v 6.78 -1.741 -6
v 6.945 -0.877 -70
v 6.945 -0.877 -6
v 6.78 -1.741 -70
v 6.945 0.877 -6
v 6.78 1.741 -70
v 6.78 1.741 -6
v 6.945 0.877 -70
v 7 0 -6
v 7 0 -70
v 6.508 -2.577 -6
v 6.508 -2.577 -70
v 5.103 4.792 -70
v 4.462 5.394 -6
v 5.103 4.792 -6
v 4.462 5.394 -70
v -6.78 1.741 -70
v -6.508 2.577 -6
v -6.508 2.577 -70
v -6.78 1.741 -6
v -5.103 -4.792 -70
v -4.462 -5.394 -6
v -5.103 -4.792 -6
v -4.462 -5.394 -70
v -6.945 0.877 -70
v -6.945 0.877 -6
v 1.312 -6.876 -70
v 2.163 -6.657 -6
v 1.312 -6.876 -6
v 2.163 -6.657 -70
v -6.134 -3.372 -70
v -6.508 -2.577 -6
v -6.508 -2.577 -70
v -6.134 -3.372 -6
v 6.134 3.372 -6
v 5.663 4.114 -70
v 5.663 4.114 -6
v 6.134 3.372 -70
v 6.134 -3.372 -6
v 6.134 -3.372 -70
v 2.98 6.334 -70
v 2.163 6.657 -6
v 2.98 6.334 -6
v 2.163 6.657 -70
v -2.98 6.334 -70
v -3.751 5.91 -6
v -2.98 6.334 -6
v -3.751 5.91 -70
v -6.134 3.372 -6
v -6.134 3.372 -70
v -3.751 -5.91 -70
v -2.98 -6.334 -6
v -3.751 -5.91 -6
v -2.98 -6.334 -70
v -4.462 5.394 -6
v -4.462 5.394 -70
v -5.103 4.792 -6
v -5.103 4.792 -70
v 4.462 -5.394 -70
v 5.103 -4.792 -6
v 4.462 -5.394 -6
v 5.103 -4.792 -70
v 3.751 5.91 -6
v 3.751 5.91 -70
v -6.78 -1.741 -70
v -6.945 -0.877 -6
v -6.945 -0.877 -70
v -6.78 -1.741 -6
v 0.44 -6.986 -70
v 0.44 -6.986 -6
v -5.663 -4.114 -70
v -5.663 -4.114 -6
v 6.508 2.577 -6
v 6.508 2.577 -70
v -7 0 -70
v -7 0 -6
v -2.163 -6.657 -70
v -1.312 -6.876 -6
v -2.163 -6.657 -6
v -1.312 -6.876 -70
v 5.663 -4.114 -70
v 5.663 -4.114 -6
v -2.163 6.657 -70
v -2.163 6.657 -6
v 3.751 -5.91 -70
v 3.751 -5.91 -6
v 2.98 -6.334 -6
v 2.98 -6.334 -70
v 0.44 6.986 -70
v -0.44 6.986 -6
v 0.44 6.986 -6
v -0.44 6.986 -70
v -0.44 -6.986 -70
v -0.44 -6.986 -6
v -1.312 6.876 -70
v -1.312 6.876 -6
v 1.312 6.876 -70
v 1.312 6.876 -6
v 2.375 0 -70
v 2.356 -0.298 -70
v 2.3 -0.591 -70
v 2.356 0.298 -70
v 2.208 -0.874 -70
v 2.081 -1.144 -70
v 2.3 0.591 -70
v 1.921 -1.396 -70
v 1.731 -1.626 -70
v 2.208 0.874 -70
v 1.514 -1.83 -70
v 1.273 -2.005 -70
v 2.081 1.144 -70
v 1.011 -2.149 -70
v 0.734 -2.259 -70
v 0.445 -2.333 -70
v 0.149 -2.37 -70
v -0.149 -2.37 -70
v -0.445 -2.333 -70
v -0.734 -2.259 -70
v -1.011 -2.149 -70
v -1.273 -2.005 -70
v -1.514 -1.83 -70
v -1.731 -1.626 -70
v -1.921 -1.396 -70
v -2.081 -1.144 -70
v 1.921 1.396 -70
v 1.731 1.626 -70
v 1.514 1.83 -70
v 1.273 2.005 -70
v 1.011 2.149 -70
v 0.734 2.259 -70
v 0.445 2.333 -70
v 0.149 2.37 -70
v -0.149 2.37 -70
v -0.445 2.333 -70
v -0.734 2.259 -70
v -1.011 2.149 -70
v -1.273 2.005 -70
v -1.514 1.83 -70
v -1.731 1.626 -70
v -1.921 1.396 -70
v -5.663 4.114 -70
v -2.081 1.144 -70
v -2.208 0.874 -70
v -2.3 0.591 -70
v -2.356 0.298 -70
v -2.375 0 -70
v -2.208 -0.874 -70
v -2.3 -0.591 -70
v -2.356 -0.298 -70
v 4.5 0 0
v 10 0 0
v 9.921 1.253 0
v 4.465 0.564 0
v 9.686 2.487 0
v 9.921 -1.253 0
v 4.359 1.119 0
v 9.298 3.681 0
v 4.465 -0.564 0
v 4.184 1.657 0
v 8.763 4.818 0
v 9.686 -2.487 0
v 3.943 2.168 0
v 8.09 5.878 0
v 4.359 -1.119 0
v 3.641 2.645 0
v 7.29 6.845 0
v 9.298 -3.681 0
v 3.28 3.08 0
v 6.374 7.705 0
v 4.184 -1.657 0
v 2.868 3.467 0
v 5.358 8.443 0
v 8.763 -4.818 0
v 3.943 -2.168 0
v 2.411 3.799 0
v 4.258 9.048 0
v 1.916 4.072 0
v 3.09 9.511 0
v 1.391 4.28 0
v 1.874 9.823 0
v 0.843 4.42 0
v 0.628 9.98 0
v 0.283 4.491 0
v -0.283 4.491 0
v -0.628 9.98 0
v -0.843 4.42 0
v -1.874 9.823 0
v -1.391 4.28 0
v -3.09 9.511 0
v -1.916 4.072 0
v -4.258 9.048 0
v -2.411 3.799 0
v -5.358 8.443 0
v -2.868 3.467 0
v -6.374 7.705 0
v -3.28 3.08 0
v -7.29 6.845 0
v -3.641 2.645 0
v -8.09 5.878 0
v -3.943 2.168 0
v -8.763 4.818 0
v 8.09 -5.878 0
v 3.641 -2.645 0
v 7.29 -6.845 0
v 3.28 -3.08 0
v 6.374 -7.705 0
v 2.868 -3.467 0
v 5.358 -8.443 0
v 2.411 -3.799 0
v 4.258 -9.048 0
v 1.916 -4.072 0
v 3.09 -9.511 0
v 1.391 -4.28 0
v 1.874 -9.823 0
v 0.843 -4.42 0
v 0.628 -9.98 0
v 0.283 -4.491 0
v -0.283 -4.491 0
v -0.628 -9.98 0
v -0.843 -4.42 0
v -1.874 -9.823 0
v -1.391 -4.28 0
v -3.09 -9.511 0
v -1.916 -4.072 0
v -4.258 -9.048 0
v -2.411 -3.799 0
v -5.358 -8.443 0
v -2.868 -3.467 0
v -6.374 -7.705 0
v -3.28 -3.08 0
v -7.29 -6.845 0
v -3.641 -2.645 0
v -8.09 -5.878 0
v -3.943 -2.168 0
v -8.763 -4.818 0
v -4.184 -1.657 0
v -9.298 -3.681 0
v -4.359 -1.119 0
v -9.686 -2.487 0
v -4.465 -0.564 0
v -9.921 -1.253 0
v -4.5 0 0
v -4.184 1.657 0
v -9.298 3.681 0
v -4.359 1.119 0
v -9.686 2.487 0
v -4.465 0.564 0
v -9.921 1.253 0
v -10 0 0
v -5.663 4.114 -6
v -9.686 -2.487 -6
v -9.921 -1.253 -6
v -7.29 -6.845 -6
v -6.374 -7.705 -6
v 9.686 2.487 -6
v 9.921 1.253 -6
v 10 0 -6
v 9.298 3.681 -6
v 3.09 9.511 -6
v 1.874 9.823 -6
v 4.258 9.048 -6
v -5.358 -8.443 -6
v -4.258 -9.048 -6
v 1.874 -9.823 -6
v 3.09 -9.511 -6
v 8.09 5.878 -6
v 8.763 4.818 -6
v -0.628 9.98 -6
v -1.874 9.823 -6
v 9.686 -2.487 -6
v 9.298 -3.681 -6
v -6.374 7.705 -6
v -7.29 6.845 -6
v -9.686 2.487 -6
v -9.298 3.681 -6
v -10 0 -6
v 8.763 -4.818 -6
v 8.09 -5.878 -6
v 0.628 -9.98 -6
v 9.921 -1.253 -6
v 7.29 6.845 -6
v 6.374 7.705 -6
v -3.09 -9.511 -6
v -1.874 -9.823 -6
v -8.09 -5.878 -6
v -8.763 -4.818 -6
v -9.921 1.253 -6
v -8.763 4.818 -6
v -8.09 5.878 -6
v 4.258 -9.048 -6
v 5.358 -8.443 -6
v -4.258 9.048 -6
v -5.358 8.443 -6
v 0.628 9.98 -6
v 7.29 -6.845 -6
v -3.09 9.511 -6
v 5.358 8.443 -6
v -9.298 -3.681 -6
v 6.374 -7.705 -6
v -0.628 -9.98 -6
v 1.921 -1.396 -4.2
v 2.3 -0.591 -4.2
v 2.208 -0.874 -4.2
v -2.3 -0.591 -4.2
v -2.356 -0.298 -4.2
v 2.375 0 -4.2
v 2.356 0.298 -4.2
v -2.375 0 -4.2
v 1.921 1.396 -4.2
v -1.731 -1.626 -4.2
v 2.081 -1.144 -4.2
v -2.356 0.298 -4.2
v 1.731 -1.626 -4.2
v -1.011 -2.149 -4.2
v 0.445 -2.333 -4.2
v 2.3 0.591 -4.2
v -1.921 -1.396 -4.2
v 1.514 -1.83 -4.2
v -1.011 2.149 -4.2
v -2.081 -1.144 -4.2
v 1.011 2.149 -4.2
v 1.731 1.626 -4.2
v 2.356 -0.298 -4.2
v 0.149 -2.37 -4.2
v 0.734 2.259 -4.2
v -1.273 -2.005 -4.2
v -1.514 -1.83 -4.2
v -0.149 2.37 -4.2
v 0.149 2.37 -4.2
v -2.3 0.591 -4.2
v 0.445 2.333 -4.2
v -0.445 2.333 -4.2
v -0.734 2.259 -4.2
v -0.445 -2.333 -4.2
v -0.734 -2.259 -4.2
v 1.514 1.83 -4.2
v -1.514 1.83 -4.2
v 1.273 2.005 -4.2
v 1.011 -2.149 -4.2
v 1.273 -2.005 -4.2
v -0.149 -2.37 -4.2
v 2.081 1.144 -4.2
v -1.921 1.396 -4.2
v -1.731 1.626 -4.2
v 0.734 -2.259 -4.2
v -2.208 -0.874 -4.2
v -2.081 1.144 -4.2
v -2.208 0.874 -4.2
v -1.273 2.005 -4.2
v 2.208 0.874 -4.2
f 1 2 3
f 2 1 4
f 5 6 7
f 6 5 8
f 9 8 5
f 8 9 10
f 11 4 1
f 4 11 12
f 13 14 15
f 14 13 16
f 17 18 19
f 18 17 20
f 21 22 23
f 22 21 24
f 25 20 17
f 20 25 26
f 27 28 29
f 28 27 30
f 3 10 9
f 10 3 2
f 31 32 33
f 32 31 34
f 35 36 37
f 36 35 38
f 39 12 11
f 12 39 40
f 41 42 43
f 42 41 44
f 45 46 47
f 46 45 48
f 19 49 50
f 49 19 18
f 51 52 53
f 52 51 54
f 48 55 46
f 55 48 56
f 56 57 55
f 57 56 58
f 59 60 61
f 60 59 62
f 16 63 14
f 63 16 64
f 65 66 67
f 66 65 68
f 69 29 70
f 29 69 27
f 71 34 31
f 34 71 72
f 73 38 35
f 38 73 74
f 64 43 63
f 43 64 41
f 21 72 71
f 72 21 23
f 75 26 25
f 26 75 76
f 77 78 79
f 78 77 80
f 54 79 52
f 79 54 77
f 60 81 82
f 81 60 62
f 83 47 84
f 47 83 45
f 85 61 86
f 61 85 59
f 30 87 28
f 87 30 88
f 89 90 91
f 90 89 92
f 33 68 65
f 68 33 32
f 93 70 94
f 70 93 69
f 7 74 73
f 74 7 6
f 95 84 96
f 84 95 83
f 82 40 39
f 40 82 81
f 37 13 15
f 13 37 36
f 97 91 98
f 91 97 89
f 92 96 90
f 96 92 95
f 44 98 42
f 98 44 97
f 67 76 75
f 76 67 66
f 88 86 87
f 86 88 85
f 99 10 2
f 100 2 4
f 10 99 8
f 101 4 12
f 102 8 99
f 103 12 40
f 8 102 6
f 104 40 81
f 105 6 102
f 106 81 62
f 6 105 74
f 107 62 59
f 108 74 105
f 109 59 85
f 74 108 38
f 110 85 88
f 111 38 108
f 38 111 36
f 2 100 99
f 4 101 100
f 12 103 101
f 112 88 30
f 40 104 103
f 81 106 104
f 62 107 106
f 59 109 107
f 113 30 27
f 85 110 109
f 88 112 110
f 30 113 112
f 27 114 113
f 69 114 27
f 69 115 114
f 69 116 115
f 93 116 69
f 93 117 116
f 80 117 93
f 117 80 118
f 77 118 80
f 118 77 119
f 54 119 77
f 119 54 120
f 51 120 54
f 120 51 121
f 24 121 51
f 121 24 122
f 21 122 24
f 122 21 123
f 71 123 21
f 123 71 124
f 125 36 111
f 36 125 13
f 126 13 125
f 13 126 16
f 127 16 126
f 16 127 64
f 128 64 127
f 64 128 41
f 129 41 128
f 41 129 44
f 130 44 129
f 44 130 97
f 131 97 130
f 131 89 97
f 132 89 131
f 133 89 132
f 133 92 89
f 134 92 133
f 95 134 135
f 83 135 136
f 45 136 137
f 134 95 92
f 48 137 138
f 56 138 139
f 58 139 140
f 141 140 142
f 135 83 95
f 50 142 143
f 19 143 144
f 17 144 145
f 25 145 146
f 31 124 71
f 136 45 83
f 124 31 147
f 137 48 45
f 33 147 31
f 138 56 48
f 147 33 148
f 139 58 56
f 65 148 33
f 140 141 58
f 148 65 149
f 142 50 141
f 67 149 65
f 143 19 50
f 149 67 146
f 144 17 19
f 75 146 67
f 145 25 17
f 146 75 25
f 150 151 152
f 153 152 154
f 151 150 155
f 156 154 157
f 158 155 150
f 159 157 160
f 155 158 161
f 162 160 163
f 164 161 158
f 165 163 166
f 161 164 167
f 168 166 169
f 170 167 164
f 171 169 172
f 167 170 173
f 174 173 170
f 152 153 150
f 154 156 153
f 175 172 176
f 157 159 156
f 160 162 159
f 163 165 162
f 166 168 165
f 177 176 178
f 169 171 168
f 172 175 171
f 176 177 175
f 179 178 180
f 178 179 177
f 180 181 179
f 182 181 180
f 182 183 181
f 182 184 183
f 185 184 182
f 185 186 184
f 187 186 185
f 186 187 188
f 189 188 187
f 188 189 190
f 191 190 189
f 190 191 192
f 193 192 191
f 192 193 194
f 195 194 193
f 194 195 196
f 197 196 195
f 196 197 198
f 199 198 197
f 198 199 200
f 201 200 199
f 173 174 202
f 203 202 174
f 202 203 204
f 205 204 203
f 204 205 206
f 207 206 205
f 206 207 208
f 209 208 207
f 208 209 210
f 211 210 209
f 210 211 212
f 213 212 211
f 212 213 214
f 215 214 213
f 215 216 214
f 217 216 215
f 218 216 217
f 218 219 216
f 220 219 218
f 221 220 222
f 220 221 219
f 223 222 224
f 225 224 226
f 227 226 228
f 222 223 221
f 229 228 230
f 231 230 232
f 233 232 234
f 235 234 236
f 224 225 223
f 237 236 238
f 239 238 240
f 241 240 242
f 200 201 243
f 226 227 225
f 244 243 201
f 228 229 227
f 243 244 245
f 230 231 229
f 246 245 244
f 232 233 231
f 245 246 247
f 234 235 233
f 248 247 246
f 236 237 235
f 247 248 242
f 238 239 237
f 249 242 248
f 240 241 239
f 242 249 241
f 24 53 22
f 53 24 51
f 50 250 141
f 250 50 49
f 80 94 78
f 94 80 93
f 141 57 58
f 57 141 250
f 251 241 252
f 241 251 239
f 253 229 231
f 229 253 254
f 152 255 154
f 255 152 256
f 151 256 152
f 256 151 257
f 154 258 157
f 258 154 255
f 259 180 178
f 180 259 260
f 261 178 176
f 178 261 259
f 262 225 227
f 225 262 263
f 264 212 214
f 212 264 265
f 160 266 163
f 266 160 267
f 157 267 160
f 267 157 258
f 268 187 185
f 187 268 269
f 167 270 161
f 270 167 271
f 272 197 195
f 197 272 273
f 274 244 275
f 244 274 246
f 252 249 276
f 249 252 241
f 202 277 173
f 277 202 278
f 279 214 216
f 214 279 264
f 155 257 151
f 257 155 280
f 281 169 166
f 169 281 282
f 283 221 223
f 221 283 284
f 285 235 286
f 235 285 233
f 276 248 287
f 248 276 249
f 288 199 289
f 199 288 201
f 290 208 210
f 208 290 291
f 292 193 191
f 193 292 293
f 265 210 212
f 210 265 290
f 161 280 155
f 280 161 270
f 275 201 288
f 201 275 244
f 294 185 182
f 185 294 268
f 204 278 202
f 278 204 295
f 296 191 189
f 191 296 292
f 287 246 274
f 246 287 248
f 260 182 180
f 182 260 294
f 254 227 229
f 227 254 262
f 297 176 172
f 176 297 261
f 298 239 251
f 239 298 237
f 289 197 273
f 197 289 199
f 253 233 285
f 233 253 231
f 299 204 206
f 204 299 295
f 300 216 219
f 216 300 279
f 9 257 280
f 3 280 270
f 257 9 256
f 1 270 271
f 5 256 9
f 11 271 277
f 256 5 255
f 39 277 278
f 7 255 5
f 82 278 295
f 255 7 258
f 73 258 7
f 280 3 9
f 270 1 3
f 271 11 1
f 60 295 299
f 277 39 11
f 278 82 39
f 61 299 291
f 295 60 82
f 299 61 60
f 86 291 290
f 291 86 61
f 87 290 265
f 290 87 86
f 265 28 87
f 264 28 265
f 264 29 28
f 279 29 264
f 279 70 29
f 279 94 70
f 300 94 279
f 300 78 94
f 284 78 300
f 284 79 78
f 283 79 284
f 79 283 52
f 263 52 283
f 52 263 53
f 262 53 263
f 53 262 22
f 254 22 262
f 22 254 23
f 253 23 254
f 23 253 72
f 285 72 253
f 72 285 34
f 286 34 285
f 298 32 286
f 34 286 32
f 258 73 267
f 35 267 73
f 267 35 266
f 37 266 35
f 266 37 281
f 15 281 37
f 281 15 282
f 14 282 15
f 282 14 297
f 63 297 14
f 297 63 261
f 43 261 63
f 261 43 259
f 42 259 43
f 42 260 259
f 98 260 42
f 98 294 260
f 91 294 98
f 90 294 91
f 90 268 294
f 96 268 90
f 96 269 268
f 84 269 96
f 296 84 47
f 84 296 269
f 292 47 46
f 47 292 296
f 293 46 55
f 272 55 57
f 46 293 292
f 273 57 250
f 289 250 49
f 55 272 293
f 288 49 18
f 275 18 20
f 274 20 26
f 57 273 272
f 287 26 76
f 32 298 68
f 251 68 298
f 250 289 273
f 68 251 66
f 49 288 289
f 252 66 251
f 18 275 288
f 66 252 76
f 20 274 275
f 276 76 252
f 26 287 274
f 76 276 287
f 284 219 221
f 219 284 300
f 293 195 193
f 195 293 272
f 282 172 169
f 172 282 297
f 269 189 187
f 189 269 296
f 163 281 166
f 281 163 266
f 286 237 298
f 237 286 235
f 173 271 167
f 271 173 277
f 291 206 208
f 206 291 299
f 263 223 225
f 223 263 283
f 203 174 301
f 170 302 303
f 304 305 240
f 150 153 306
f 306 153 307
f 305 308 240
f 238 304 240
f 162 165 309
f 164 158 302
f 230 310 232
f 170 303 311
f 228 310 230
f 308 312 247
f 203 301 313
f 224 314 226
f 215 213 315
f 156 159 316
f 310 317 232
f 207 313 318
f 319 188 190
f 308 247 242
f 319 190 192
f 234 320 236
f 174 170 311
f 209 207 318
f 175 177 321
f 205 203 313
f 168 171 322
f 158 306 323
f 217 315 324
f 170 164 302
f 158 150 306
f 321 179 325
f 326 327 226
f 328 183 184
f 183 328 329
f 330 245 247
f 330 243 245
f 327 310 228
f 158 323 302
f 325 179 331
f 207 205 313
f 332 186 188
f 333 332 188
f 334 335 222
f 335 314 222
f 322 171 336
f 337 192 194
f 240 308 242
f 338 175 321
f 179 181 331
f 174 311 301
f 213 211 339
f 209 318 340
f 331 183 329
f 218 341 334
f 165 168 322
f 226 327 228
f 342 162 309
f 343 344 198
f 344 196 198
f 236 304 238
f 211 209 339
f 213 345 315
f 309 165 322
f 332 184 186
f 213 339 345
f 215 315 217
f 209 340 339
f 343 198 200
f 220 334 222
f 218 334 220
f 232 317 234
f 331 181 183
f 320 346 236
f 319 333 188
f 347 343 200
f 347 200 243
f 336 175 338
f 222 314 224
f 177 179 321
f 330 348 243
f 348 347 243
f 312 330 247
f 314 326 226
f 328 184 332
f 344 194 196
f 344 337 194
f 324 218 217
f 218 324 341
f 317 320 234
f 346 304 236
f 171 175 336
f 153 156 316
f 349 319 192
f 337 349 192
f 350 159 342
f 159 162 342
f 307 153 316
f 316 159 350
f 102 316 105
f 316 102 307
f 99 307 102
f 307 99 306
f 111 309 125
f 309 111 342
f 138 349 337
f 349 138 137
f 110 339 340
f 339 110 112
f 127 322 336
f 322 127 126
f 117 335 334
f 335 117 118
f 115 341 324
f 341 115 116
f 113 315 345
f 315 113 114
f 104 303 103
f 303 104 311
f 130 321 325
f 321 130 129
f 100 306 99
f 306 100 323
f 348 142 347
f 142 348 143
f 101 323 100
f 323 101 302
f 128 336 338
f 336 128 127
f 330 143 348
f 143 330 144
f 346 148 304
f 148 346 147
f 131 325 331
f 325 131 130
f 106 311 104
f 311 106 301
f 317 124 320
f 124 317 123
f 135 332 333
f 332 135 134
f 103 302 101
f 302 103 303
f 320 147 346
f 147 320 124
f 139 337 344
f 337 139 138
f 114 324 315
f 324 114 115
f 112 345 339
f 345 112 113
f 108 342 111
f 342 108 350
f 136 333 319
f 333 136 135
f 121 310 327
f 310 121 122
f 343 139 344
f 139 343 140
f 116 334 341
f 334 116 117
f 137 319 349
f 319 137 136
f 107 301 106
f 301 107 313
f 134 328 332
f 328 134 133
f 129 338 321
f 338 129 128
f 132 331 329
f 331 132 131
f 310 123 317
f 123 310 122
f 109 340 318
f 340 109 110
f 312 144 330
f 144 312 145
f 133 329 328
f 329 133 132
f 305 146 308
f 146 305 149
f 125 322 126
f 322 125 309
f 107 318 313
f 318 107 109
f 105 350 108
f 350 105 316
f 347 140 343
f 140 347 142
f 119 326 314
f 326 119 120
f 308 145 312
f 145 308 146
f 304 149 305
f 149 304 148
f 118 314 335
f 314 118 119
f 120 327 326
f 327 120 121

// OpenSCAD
$fn = 50;


difference() {
	union() {
		translate(v = [0, 0, -70.0000000000]) {
			cylinder(h = 70, r = 7.0000000000);
		}
		translate(v = [0, 0, -6.0000000000]) {
			cylinder(h = 6, r = 10.0000000000);
		}
	}
	union() {
		translate(v = [0, 0, 0]) {
			rotate(a = [0, 0, 0]) {
				difference() {
					union() {
						#translate(v = [0, 0, -70.0000000000]) {
							cylinder(h = 70, r = 2.2500000000);
						}
						#translate(v = [0, 0, -4.2000000000]) {
							cylinder(h = 4.2000000000, r1 = 2.3750000000, r2 = 4.5000000000);
						}
						#translate(v = [0, 0, -70.0000000000]) {
							cylinder(h = 70, r = 2.3750000000);
						}
						#translate(v = [0, 0, -70.0000000000]) {
							cylinder(h = 70, r = 2.2500000000);
						}
					}
					union();
				}
			}
		}
	}
}
